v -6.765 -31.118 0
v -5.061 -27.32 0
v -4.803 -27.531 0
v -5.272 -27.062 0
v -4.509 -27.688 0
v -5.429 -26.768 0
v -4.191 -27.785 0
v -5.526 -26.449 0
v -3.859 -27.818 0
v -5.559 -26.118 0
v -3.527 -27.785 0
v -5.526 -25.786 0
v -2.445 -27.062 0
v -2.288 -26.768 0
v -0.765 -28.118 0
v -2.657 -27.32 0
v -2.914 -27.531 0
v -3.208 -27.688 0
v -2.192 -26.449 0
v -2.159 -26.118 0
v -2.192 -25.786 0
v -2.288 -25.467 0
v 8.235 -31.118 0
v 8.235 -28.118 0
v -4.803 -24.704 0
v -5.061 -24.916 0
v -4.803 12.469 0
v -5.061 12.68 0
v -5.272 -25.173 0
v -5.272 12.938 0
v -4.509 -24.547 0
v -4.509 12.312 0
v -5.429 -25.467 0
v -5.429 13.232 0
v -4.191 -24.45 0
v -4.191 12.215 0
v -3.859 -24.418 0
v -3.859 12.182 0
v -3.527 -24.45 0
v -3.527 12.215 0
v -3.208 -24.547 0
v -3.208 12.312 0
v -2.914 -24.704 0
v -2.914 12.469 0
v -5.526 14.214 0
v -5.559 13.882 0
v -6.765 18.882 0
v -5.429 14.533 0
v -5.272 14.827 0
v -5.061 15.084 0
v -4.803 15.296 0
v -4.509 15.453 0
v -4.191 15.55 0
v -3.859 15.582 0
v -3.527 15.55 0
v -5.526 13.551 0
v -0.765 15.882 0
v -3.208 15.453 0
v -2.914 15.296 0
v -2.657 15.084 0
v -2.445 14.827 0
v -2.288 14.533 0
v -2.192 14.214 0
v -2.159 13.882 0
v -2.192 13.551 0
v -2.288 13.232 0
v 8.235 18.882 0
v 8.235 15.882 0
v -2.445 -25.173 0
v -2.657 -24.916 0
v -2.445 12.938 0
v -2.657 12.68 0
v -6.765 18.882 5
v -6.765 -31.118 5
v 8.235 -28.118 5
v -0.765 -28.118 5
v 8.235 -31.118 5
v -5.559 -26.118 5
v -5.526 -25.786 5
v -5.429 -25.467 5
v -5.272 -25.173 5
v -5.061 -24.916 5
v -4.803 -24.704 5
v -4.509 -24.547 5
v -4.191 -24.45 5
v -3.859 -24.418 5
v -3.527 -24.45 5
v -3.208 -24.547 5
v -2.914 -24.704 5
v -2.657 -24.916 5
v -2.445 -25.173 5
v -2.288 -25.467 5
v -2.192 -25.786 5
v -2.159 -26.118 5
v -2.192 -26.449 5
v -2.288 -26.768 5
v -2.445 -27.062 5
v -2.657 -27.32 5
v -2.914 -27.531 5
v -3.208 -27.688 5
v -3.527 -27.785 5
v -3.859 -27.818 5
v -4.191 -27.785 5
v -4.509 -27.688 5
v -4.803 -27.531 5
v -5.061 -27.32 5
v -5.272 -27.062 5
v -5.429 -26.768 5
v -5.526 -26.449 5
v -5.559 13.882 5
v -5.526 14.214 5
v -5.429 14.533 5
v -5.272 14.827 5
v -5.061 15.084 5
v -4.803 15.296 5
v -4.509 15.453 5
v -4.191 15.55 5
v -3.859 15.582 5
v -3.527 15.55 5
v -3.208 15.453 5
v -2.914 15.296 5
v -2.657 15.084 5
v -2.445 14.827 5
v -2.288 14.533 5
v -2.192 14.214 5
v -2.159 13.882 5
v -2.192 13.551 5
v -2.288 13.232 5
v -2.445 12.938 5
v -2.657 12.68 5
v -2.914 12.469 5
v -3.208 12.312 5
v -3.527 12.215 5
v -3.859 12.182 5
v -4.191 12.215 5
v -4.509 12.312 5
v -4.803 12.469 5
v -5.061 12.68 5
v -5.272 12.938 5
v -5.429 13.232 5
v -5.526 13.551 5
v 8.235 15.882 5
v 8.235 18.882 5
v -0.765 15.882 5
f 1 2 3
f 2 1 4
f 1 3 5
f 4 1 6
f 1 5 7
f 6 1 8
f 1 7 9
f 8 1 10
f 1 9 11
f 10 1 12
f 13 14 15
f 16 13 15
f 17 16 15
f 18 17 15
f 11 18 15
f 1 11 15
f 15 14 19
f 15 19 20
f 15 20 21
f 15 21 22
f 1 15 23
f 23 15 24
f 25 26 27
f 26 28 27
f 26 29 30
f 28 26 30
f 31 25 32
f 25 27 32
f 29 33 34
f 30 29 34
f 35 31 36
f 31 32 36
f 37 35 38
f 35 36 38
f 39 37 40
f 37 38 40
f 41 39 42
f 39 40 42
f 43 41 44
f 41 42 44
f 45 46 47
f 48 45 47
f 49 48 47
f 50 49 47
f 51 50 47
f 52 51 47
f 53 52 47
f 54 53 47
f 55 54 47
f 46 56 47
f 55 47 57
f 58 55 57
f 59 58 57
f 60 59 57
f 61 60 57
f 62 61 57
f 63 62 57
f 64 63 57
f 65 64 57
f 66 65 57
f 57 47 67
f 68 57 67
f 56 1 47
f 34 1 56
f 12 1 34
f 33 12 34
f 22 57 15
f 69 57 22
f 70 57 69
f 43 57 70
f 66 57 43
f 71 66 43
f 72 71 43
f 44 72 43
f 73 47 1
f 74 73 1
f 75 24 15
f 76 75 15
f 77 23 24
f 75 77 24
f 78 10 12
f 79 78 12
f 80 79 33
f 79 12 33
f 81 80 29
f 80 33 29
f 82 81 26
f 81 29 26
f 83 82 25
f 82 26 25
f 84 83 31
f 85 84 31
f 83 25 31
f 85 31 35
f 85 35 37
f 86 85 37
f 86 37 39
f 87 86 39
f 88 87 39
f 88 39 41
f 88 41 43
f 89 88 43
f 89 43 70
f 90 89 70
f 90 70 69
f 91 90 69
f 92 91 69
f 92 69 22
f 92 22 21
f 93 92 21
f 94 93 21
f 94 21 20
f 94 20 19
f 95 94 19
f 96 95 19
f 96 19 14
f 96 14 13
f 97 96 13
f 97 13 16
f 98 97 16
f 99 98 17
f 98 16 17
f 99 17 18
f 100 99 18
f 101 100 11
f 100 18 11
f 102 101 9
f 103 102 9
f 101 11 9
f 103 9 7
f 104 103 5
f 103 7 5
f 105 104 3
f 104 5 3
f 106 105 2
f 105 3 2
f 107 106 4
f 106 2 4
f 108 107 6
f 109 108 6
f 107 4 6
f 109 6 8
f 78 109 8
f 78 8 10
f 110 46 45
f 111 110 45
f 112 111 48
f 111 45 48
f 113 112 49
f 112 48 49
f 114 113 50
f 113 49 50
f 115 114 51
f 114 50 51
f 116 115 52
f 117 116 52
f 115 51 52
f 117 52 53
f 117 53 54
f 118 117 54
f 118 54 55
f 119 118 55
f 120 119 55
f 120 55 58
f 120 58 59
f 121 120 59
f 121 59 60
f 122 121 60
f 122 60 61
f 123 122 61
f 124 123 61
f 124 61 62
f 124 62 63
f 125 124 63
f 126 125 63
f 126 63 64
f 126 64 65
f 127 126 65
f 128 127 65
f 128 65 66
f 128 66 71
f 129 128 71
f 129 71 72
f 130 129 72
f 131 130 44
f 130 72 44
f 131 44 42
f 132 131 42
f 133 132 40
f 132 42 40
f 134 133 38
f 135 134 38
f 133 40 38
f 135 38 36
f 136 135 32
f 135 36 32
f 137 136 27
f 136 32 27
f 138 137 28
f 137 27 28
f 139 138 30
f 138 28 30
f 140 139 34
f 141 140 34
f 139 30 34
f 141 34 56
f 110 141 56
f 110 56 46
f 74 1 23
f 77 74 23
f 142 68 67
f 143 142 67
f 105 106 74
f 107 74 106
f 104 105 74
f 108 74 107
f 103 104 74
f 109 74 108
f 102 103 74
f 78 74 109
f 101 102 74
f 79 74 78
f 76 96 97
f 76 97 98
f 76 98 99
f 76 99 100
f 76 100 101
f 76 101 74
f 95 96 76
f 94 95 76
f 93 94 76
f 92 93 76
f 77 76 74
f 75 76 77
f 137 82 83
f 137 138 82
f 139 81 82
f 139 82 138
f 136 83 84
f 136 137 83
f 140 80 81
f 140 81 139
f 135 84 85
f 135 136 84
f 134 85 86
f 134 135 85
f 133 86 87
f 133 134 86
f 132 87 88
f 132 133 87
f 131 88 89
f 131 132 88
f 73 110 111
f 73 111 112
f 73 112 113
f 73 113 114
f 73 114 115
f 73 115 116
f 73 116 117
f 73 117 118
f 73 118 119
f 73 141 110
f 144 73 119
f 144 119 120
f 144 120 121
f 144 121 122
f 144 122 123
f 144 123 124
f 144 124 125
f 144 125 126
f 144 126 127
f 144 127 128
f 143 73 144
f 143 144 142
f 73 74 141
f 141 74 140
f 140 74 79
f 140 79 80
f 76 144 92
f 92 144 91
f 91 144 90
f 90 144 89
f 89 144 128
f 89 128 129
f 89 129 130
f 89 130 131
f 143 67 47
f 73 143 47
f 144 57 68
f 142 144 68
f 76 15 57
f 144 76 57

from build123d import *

# Parameters (mm, degrees)
BOSS_EXTRUDE1_DEPTH  = 5
M3_CLEARANCE_HOLE2_D = 3.4


with BuildPart() as part:
    # Sketch1 → Boss-Extrude1 (new body)
    with BuildSketch(Plane.XY):
        Polygon((8.235294118, 15.882352941), (8.235294118, 18.882352941), (-6.764705882, 18.882352941), (-6.764705882, 14.294117647), (-6.764705882, -25.352941176), (-6.764705882, -31.117647059), (-0.882352941, -31.117647059), (8.235294118, -31.117647059), (8.235294118, -28.117647059), (-0.764705882, -28.117647059), (-0.764705882, 15.882352941), align=None)
    extrude(amount=BOSS_EXTRUDE1_DEPTH)

    # M3 Clearance Hole2 (through all)
    with Locations(Plane.XY.offset(5)):
        with Locations((-3.858851748, 13.882352941), (-3.858851748, -26.117647059)):
            Hole(M3_CLEARANCE_HOLE2_D / 2)


solid = part.part
